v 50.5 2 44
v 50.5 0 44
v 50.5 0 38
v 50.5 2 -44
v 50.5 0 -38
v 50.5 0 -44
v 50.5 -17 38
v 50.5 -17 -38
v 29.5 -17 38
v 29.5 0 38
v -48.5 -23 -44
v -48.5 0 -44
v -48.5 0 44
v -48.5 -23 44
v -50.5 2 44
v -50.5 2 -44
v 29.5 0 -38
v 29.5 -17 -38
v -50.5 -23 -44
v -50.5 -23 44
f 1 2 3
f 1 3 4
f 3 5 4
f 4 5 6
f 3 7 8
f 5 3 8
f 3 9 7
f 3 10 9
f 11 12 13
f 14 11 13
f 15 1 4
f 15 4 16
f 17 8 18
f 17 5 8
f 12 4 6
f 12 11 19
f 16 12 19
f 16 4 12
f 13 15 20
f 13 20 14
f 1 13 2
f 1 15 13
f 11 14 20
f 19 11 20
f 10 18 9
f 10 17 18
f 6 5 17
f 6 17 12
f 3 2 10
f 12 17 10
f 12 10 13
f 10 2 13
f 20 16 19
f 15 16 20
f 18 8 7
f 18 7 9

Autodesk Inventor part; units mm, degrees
ref_plane "YZ Plane" through (0, 0, 0) normal (1, 0, 0) x (0, 1, 0)
ref_plane "XZ Plane" through (0, 0, 0) normal (0, 1, 0) x (-1, 0, 0)
sketch "Esboço1" plane through (0, 0, 0) normal (0, 1, 0) x (-1, 0, 0)
  line L0 (50.5, 44) -> (-50.5, 44)
  line L1 (-50.5, 44) -> (-50.5, -44)
  line L2 (-50.5, -44) -> (50.5, -44)
  line L3 (50.5, -44) -> (50.5, 44)
  line L4 (50.5, 44) -> (-50.5, -44) construction
  line L5 (-50.5, 44) -> (50.5, -44) construction
  line L6 (-29.5, 38) -> (-50.5, 38)
  line L7 (-50.5, 38) -> (-50.5, -38)
  line L8 (-50.5, -38) -> (-29.5, -38)
  line L9 (-29.5, -38) -> (-29.5, 38)
  line L10 (-29.5, 38) -> (-50.5, -38) construction
  line L11 (-50.5, 38) -> (-29.5, -38) construction
  line L12 (48.5, -44) -> (48.5, 44)
  point P0 (0, 0)
  point P1 (-40, 0)
  dimension "d0" = 101
  dimension "d1" = 88
  dimension "d2" = 21
  dimension "d3" = 76
  dimension "d4" = 2
extrude "Extrusão1" add sketch "Esboço1" along normal blind 2
extrude "Extrusão2" add sketch "Esboço1" against normal blind 23 contours L3 L2 L12 L0
extrude "Extrusão3" add sketch "Esboço1" against normal blind 17 contours L6 L9 L8 L1
ref_plane "Plano de trabalho1" through (0, 0, 0) normal (0, 1, 0) x (1, 0, 0)
split_face "Dividir1"
sketch "Esboço2" plane through (0, 2, 0) normal (0, 1, 0) x (1, 0, 0)
  line L0 (-50.5, 44) -> (-50.5, -44) projected
  line L1 (-40, -40) -> (-40, 40) construction
  line L2 (-40, 40) -> (40, 40) construction
  line L3 (40, 40) -> (40, -40) construction
  line L4 (40, -40) -> (-40, -40) construction
  line L5 (-40, -40) -> (40, 40) construction
  point P0 (0, 0)
  point P1 (0, 0)
  dimension "d25" = 80
properties part number "Bitdoglab"
